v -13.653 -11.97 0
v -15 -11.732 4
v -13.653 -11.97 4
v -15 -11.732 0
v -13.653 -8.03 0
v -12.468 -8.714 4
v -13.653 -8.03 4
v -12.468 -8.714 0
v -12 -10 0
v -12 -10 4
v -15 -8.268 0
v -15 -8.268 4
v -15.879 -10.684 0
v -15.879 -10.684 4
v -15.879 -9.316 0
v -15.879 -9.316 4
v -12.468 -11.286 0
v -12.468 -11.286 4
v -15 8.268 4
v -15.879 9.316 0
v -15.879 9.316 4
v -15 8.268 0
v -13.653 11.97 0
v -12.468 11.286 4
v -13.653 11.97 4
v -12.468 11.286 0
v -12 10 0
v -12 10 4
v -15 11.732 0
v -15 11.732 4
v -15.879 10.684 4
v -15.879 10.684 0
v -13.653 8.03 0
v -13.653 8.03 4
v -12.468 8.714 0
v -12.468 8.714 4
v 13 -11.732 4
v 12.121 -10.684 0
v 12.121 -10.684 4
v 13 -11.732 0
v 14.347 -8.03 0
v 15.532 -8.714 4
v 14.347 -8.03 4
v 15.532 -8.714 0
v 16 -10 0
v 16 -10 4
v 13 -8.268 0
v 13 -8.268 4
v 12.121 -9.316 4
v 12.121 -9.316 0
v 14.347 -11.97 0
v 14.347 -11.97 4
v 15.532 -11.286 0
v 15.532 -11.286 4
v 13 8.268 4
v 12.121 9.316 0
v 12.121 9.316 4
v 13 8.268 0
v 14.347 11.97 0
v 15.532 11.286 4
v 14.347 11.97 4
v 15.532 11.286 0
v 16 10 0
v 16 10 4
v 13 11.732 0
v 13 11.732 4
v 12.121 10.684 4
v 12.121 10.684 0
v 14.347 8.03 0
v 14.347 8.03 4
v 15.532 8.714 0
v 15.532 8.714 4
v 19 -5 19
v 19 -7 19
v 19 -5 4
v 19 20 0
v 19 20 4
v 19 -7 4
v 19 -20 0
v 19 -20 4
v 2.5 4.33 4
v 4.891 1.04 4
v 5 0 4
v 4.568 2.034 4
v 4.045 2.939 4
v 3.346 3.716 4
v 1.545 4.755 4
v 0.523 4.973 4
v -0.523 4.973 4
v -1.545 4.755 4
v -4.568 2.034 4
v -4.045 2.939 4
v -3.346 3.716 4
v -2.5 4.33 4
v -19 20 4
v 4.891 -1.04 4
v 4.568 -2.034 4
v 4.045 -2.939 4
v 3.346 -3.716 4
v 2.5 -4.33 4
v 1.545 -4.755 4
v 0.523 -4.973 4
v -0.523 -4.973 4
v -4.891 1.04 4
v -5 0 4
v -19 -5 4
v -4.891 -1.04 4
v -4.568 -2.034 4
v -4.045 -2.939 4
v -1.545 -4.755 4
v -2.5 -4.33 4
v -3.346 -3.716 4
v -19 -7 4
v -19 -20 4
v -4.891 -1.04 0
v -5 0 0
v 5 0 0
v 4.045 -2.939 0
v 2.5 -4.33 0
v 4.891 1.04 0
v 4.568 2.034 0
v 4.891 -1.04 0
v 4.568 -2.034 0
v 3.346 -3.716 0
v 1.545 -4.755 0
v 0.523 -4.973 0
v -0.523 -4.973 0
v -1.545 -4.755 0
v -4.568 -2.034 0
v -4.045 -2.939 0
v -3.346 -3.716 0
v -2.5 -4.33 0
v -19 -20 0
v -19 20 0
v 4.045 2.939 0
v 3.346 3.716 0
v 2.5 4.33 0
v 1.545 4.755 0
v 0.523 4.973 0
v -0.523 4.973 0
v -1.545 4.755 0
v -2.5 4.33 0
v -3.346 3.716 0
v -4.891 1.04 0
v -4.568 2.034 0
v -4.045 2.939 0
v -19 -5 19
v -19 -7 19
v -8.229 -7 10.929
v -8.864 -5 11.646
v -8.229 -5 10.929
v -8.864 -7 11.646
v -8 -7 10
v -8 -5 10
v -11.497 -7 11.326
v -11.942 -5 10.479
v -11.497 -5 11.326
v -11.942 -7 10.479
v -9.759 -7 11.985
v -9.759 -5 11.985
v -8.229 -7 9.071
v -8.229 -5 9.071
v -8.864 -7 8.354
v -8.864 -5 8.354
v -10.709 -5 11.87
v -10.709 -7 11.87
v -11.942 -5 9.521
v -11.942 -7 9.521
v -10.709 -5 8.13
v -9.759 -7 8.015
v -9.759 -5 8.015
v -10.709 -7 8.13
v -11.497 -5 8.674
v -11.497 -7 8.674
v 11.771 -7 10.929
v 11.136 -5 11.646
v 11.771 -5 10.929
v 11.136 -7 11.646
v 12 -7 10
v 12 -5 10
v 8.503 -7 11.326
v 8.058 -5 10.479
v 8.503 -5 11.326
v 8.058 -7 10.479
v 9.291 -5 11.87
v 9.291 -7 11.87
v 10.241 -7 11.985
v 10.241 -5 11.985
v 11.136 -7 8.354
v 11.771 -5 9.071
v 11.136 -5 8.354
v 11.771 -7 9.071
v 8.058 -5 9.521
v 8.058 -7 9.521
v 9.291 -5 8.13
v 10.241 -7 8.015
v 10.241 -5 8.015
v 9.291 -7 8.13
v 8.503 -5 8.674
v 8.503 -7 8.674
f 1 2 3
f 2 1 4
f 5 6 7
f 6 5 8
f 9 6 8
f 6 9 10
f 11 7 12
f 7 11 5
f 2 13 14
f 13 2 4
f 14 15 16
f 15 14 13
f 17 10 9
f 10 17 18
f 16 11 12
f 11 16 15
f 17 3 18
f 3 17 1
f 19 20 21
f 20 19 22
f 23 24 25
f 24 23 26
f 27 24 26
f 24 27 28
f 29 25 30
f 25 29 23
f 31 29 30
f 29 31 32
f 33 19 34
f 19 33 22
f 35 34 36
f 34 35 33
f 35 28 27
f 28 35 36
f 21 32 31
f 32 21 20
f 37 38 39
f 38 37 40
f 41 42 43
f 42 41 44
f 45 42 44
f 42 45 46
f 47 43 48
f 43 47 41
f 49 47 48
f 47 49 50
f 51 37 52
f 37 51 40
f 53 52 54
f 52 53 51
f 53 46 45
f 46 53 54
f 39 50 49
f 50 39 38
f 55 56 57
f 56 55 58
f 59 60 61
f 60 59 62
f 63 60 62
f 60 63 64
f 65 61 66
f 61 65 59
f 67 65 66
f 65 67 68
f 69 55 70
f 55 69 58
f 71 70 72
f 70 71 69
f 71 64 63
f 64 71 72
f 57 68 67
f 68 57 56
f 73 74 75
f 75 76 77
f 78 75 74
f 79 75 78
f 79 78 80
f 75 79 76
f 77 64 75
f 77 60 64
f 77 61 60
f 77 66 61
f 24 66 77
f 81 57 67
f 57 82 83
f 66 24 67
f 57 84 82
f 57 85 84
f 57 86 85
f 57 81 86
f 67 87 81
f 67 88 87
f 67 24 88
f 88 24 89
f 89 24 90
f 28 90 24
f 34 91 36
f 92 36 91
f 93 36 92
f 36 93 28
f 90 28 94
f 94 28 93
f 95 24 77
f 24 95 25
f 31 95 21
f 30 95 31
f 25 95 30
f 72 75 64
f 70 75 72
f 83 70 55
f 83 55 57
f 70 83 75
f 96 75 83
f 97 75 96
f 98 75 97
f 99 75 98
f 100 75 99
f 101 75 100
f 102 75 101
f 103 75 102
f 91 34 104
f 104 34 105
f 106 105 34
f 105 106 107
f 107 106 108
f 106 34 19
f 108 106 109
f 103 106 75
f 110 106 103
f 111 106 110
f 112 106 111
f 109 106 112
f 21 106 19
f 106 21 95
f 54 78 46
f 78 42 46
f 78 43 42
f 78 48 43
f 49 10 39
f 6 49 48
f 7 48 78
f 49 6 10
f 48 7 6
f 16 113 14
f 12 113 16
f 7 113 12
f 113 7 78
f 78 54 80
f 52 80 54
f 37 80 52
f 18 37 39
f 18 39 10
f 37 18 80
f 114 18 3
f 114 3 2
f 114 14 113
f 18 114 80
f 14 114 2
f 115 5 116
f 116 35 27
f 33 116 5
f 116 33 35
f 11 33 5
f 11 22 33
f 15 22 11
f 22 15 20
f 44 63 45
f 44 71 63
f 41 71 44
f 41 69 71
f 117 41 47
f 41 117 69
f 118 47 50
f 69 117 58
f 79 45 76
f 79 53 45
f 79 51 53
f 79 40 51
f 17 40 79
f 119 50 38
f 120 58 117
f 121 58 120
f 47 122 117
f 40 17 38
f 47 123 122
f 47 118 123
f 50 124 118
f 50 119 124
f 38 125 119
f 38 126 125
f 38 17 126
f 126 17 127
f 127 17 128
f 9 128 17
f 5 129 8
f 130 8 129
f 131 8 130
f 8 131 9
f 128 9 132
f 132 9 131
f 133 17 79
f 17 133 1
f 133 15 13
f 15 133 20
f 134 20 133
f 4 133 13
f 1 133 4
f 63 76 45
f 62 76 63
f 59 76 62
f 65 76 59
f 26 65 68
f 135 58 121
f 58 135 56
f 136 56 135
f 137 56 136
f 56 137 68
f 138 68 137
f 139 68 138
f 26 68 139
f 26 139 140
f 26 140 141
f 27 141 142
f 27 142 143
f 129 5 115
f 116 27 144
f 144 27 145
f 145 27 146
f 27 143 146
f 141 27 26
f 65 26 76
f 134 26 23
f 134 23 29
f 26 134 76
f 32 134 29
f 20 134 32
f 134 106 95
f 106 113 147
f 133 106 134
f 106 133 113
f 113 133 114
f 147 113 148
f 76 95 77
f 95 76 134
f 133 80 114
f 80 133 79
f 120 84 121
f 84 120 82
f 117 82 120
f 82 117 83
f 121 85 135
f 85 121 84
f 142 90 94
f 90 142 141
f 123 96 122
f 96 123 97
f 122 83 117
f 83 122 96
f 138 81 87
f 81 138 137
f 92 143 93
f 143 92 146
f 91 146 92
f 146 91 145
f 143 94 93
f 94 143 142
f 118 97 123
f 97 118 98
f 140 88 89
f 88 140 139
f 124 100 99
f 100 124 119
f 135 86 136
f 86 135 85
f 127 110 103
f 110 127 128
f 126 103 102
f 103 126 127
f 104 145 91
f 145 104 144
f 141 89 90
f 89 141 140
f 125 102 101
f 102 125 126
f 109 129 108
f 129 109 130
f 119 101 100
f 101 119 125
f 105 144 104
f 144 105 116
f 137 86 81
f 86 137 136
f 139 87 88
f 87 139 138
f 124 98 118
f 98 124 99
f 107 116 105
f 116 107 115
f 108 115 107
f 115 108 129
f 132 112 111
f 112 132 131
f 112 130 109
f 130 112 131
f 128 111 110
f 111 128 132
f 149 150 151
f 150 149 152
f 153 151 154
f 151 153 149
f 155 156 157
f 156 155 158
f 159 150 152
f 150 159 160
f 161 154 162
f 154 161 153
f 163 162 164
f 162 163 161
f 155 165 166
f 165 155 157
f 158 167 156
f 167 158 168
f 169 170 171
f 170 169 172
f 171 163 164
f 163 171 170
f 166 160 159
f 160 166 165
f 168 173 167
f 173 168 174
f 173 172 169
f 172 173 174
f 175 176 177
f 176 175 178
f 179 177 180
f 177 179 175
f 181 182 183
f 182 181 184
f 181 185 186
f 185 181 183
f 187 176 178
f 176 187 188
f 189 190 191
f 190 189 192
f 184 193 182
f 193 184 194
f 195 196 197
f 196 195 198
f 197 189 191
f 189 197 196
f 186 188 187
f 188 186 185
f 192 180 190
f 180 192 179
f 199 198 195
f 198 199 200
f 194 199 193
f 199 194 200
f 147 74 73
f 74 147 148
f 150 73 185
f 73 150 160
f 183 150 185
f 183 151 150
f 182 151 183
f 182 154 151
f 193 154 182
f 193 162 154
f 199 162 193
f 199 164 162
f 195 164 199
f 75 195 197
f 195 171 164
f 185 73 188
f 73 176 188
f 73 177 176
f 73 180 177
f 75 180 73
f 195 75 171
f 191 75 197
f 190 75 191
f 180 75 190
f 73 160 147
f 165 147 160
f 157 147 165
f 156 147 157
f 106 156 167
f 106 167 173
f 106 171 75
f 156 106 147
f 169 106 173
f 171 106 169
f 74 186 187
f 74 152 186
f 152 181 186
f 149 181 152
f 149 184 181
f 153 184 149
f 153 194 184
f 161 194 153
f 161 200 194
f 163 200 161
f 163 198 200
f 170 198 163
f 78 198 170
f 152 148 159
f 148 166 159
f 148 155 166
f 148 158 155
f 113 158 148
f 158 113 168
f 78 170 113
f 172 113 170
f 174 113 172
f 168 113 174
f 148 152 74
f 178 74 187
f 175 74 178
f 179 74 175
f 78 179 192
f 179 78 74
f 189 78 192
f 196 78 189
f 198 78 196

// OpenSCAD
// file: servoMountLock.scad
module servoMountLock()
{
  difference()
  {
    translate([-14-5, -10-10, 0])
      cube([2*(14+5), 2*(10+10), 4.5]);
    // screw holes
    for(dx = [-1, +1])
      for(dy = [-1, +1])
        translate([dx*14, dy*10, -2])
          cylinder(r=(3+1)/2, $fs=1.5, h=4.5+4);
    // main rod mounting hole
    translate([-(7.5+1)/2, -(30+1)/2, 4.5-(2+0.5)])
      cube([7.5+1, 30+1, 2+0.5]);
    // center, thicker part
    translate([-(10+1)/2, -(10+1)/2, 4.5-(3.5+0.5)])
      cube([10+1, 10+1, 3.5+0.5]);
    // servo's screw space
    translate([0, 0, -1])
      cylinder(r=(9+1)/2, h=6, $fs=1);
  }
}

for(i=[0:1])
  translate([0, i*45, 0])
    servoMountLock();
// main file
use <servoMountLock.scad>

module tiltMountBase()
{
  difference()
  {
    translate([-14-5, -10-10, 0])
      cube([2*(14+5), 2*(10+10), 4]);
    // screw holes
    for(dx = [-1, +1])
      for(dy = [-1, +1])
        translate([dx*14, dy*10, -2])
          cylinder(r=(3+1)/2, $fs=1.5, h=4+4);
    // servo's screw space
    translate([0, 0, -1])
      cylinder(r=(9+1)/2, h=6, $fs=1);
  }
  // screw mounting field
  difference()
  {
    translate([-(2*(14+5))/2, -7, 4])
      cube([2*(14+5), 2, 15]);
    // screws
    for(dx=[-10, +10])
      translate([dx, -4, 10])
        rotate([90, 0, 0])
          cylinder(r=(3+1)/2, h=4, $fs=1);
    
  }
}

tiltMountBase();

%rotate([180, 0, 0])
  servoMountLock();
